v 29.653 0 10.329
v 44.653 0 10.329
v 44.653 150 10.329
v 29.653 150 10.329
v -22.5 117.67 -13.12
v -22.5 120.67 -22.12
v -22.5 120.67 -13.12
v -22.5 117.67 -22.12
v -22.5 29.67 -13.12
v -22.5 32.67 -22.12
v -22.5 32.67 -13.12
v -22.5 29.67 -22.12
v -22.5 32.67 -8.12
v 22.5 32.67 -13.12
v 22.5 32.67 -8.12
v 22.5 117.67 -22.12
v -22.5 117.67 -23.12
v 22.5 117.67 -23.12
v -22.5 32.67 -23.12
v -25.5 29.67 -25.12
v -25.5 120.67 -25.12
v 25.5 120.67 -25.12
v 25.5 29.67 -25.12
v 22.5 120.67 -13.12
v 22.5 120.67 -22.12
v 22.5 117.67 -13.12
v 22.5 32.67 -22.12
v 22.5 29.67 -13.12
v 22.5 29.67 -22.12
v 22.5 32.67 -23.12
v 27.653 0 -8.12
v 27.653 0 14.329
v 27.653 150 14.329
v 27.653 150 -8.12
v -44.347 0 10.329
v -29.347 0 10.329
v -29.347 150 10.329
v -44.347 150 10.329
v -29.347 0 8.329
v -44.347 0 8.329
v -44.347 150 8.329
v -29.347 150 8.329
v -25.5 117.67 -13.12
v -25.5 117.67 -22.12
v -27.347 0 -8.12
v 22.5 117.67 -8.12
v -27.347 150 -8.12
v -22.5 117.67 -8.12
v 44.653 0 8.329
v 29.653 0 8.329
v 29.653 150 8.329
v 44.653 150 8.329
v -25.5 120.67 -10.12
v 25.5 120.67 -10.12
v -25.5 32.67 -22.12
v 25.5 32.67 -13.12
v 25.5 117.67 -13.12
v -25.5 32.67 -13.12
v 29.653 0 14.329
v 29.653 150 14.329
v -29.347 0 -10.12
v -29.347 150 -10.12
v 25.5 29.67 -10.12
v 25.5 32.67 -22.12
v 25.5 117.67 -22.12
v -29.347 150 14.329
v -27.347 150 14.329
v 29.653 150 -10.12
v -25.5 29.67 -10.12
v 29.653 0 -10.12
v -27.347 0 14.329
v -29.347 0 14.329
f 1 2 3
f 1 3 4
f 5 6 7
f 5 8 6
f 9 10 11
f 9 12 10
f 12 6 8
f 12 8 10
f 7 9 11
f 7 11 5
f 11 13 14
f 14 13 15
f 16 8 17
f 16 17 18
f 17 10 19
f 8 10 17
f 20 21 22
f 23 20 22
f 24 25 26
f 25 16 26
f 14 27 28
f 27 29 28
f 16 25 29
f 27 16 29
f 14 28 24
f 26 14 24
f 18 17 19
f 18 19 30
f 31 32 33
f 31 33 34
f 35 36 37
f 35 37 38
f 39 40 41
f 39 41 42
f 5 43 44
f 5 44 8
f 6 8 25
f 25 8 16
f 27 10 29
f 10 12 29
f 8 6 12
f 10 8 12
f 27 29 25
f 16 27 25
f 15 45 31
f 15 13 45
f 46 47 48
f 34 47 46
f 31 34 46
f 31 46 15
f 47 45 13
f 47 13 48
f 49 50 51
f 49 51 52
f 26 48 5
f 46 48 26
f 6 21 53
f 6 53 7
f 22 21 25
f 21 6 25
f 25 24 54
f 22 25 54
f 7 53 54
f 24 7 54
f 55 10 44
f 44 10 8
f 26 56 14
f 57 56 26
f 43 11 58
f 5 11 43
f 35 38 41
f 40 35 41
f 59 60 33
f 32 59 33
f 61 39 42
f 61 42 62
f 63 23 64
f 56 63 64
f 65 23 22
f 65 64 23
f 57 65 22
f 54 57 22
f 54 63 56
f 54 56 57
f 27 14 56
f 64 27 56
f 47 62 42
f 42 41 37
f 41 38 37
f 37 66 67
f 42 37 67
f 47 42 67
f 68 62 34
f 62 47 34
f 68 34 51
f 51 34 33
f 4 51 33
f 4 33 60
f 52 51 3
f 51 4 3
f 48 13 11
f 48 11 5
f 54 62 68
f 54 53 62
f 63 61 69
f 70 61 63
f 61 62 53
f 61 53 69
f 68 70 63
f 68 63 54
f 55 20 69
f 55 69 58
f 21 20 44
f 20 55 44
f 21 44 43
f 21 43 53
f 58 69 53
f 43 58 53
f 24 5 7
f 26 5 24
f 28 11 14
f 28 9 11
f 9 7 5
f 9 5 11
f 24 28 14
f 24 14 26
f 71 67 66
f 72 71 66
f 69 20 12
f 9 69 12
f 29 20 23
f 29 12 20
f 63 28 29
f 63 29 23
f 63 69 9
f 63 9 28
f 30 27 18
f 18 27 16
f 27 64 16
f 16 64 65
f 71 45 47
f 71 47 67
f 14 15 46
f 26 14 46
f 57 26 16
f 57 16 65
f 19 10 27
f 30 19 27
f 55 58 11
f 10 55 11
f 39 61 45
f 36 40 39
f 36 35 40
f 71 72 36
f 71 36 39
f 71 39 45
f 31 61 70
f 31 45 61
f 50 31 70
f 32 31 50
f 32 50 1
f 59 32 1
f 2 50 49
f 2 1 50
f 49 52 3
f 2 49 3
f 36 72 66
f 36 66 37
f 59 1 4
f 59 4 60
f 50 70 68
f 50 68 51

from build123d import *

# Parameters (mm, degrees)
F1_DEPTH = 150
F2_W     = 51
F2_H     = 91
F2_W_2   = 45
F2_H_2   = 85
F3_DEPTH = 17
F4_DEPTH = 15
F5_W     = 85
F5_H     = 9
F6_DEPTH = 75
F7_W     = 45.0000017881
F7_H     = 9.0000017881
F8_DEPTH = 95


with BuildPart() as f1:
    # F0 (on Front) → F1 (new body)
    with BuildSketch(Plane.XZ):
        Polygon((-44.3471273035, 8.3293294263), (-29.3471273035, 8.3293294263), (-29.3471273035, 10.3293294263), (-30.6854649693, 10.3293294263), (-32.7072627842, 10.3293294263), (-44.3471273035, 10.3293294263), align=None)
        Polygon((-29.3471273035, -10.1195359603), (29.6528726965, -10.1195359603), (29.6528726965, 8.3293294263), (29.6528726965, 10.3293294263), (29.6528726965, 14.3293294263), (27.6528726965, 14.3293294263), (27.6528726965, 10.3293294263), (27.6528726965, 9.2171130797), (27.6528726965, -8.1195359603), (-27.3471273035, -8.1195359603), (-27.3471273035, 9.2171130797), (-27.3471273035, 10.3293294263), (-27.3471273035, 14.3293294263), (-29.3471273035, 14.3293294263), (-29.3471273035, 10.3293294263), (-29.3471273035, 8.3293294263), align=None)
        Polygon((29.6528726965, 10.3293294263), (29.6528726965, 8.3293294263), (44.6528726965, 8.3293294263), (44.6528726965, 10.3293294263), (41.5029401332, 10.3293294263), (33.3236008883, 10.3293294263), align=None)
    extrude(amount=-F1_DEPTH)

    # F2 (on face) → F3 (join)
    with BuildSketch(Plane.XY.offset(-8.1195359603)):
        with Locations((0, 75.1699954271)):
            Rectangle(F2_W, F2_H)
        with Locations((0, 75.1699954271)):
            Rectangle(F2_W_2, F2_H_2, mode=Mode.SUBTRACT)
        with Locations((0, 75.1699954271)):
            Rectangle(F2_W_2, F2_H_2)
    extrude(amount=-F3_DEPTH)

    # F2 (on face) → F4 (cut)
    with BuildSketch(Plane.XY.offset(-8.1195359603)):
        with Locations((0, 75.1699954271)):
            Rectangle(F2_W_2, F2_H_2)
    extrude(amount=-F4_DEPTH, mode=Mode.SUBTRACT)

    # F5 (on face) → F6 (cut)
    with BuildSketch(Plane.YZ.offset(25.5)):
        with Locations((75.1699954271, -17.6195359603)):
            Rectangle(F5_W, F5_H)
    extrude(amount=-F6_DEPTH, mode=Mode.SUBTRACT)

    # F7 (on face) → F8 (cut)
    with BuildSketch(Plane.XZ.offset(-29.6699954271)):
        with Locations((0, -17.6195359603)):
            Rectangle(F7_W, F7_H)
    extrude(amount=-F8_DEPTH, mode=Mode.SUBTRACT)


solid = f1.part
